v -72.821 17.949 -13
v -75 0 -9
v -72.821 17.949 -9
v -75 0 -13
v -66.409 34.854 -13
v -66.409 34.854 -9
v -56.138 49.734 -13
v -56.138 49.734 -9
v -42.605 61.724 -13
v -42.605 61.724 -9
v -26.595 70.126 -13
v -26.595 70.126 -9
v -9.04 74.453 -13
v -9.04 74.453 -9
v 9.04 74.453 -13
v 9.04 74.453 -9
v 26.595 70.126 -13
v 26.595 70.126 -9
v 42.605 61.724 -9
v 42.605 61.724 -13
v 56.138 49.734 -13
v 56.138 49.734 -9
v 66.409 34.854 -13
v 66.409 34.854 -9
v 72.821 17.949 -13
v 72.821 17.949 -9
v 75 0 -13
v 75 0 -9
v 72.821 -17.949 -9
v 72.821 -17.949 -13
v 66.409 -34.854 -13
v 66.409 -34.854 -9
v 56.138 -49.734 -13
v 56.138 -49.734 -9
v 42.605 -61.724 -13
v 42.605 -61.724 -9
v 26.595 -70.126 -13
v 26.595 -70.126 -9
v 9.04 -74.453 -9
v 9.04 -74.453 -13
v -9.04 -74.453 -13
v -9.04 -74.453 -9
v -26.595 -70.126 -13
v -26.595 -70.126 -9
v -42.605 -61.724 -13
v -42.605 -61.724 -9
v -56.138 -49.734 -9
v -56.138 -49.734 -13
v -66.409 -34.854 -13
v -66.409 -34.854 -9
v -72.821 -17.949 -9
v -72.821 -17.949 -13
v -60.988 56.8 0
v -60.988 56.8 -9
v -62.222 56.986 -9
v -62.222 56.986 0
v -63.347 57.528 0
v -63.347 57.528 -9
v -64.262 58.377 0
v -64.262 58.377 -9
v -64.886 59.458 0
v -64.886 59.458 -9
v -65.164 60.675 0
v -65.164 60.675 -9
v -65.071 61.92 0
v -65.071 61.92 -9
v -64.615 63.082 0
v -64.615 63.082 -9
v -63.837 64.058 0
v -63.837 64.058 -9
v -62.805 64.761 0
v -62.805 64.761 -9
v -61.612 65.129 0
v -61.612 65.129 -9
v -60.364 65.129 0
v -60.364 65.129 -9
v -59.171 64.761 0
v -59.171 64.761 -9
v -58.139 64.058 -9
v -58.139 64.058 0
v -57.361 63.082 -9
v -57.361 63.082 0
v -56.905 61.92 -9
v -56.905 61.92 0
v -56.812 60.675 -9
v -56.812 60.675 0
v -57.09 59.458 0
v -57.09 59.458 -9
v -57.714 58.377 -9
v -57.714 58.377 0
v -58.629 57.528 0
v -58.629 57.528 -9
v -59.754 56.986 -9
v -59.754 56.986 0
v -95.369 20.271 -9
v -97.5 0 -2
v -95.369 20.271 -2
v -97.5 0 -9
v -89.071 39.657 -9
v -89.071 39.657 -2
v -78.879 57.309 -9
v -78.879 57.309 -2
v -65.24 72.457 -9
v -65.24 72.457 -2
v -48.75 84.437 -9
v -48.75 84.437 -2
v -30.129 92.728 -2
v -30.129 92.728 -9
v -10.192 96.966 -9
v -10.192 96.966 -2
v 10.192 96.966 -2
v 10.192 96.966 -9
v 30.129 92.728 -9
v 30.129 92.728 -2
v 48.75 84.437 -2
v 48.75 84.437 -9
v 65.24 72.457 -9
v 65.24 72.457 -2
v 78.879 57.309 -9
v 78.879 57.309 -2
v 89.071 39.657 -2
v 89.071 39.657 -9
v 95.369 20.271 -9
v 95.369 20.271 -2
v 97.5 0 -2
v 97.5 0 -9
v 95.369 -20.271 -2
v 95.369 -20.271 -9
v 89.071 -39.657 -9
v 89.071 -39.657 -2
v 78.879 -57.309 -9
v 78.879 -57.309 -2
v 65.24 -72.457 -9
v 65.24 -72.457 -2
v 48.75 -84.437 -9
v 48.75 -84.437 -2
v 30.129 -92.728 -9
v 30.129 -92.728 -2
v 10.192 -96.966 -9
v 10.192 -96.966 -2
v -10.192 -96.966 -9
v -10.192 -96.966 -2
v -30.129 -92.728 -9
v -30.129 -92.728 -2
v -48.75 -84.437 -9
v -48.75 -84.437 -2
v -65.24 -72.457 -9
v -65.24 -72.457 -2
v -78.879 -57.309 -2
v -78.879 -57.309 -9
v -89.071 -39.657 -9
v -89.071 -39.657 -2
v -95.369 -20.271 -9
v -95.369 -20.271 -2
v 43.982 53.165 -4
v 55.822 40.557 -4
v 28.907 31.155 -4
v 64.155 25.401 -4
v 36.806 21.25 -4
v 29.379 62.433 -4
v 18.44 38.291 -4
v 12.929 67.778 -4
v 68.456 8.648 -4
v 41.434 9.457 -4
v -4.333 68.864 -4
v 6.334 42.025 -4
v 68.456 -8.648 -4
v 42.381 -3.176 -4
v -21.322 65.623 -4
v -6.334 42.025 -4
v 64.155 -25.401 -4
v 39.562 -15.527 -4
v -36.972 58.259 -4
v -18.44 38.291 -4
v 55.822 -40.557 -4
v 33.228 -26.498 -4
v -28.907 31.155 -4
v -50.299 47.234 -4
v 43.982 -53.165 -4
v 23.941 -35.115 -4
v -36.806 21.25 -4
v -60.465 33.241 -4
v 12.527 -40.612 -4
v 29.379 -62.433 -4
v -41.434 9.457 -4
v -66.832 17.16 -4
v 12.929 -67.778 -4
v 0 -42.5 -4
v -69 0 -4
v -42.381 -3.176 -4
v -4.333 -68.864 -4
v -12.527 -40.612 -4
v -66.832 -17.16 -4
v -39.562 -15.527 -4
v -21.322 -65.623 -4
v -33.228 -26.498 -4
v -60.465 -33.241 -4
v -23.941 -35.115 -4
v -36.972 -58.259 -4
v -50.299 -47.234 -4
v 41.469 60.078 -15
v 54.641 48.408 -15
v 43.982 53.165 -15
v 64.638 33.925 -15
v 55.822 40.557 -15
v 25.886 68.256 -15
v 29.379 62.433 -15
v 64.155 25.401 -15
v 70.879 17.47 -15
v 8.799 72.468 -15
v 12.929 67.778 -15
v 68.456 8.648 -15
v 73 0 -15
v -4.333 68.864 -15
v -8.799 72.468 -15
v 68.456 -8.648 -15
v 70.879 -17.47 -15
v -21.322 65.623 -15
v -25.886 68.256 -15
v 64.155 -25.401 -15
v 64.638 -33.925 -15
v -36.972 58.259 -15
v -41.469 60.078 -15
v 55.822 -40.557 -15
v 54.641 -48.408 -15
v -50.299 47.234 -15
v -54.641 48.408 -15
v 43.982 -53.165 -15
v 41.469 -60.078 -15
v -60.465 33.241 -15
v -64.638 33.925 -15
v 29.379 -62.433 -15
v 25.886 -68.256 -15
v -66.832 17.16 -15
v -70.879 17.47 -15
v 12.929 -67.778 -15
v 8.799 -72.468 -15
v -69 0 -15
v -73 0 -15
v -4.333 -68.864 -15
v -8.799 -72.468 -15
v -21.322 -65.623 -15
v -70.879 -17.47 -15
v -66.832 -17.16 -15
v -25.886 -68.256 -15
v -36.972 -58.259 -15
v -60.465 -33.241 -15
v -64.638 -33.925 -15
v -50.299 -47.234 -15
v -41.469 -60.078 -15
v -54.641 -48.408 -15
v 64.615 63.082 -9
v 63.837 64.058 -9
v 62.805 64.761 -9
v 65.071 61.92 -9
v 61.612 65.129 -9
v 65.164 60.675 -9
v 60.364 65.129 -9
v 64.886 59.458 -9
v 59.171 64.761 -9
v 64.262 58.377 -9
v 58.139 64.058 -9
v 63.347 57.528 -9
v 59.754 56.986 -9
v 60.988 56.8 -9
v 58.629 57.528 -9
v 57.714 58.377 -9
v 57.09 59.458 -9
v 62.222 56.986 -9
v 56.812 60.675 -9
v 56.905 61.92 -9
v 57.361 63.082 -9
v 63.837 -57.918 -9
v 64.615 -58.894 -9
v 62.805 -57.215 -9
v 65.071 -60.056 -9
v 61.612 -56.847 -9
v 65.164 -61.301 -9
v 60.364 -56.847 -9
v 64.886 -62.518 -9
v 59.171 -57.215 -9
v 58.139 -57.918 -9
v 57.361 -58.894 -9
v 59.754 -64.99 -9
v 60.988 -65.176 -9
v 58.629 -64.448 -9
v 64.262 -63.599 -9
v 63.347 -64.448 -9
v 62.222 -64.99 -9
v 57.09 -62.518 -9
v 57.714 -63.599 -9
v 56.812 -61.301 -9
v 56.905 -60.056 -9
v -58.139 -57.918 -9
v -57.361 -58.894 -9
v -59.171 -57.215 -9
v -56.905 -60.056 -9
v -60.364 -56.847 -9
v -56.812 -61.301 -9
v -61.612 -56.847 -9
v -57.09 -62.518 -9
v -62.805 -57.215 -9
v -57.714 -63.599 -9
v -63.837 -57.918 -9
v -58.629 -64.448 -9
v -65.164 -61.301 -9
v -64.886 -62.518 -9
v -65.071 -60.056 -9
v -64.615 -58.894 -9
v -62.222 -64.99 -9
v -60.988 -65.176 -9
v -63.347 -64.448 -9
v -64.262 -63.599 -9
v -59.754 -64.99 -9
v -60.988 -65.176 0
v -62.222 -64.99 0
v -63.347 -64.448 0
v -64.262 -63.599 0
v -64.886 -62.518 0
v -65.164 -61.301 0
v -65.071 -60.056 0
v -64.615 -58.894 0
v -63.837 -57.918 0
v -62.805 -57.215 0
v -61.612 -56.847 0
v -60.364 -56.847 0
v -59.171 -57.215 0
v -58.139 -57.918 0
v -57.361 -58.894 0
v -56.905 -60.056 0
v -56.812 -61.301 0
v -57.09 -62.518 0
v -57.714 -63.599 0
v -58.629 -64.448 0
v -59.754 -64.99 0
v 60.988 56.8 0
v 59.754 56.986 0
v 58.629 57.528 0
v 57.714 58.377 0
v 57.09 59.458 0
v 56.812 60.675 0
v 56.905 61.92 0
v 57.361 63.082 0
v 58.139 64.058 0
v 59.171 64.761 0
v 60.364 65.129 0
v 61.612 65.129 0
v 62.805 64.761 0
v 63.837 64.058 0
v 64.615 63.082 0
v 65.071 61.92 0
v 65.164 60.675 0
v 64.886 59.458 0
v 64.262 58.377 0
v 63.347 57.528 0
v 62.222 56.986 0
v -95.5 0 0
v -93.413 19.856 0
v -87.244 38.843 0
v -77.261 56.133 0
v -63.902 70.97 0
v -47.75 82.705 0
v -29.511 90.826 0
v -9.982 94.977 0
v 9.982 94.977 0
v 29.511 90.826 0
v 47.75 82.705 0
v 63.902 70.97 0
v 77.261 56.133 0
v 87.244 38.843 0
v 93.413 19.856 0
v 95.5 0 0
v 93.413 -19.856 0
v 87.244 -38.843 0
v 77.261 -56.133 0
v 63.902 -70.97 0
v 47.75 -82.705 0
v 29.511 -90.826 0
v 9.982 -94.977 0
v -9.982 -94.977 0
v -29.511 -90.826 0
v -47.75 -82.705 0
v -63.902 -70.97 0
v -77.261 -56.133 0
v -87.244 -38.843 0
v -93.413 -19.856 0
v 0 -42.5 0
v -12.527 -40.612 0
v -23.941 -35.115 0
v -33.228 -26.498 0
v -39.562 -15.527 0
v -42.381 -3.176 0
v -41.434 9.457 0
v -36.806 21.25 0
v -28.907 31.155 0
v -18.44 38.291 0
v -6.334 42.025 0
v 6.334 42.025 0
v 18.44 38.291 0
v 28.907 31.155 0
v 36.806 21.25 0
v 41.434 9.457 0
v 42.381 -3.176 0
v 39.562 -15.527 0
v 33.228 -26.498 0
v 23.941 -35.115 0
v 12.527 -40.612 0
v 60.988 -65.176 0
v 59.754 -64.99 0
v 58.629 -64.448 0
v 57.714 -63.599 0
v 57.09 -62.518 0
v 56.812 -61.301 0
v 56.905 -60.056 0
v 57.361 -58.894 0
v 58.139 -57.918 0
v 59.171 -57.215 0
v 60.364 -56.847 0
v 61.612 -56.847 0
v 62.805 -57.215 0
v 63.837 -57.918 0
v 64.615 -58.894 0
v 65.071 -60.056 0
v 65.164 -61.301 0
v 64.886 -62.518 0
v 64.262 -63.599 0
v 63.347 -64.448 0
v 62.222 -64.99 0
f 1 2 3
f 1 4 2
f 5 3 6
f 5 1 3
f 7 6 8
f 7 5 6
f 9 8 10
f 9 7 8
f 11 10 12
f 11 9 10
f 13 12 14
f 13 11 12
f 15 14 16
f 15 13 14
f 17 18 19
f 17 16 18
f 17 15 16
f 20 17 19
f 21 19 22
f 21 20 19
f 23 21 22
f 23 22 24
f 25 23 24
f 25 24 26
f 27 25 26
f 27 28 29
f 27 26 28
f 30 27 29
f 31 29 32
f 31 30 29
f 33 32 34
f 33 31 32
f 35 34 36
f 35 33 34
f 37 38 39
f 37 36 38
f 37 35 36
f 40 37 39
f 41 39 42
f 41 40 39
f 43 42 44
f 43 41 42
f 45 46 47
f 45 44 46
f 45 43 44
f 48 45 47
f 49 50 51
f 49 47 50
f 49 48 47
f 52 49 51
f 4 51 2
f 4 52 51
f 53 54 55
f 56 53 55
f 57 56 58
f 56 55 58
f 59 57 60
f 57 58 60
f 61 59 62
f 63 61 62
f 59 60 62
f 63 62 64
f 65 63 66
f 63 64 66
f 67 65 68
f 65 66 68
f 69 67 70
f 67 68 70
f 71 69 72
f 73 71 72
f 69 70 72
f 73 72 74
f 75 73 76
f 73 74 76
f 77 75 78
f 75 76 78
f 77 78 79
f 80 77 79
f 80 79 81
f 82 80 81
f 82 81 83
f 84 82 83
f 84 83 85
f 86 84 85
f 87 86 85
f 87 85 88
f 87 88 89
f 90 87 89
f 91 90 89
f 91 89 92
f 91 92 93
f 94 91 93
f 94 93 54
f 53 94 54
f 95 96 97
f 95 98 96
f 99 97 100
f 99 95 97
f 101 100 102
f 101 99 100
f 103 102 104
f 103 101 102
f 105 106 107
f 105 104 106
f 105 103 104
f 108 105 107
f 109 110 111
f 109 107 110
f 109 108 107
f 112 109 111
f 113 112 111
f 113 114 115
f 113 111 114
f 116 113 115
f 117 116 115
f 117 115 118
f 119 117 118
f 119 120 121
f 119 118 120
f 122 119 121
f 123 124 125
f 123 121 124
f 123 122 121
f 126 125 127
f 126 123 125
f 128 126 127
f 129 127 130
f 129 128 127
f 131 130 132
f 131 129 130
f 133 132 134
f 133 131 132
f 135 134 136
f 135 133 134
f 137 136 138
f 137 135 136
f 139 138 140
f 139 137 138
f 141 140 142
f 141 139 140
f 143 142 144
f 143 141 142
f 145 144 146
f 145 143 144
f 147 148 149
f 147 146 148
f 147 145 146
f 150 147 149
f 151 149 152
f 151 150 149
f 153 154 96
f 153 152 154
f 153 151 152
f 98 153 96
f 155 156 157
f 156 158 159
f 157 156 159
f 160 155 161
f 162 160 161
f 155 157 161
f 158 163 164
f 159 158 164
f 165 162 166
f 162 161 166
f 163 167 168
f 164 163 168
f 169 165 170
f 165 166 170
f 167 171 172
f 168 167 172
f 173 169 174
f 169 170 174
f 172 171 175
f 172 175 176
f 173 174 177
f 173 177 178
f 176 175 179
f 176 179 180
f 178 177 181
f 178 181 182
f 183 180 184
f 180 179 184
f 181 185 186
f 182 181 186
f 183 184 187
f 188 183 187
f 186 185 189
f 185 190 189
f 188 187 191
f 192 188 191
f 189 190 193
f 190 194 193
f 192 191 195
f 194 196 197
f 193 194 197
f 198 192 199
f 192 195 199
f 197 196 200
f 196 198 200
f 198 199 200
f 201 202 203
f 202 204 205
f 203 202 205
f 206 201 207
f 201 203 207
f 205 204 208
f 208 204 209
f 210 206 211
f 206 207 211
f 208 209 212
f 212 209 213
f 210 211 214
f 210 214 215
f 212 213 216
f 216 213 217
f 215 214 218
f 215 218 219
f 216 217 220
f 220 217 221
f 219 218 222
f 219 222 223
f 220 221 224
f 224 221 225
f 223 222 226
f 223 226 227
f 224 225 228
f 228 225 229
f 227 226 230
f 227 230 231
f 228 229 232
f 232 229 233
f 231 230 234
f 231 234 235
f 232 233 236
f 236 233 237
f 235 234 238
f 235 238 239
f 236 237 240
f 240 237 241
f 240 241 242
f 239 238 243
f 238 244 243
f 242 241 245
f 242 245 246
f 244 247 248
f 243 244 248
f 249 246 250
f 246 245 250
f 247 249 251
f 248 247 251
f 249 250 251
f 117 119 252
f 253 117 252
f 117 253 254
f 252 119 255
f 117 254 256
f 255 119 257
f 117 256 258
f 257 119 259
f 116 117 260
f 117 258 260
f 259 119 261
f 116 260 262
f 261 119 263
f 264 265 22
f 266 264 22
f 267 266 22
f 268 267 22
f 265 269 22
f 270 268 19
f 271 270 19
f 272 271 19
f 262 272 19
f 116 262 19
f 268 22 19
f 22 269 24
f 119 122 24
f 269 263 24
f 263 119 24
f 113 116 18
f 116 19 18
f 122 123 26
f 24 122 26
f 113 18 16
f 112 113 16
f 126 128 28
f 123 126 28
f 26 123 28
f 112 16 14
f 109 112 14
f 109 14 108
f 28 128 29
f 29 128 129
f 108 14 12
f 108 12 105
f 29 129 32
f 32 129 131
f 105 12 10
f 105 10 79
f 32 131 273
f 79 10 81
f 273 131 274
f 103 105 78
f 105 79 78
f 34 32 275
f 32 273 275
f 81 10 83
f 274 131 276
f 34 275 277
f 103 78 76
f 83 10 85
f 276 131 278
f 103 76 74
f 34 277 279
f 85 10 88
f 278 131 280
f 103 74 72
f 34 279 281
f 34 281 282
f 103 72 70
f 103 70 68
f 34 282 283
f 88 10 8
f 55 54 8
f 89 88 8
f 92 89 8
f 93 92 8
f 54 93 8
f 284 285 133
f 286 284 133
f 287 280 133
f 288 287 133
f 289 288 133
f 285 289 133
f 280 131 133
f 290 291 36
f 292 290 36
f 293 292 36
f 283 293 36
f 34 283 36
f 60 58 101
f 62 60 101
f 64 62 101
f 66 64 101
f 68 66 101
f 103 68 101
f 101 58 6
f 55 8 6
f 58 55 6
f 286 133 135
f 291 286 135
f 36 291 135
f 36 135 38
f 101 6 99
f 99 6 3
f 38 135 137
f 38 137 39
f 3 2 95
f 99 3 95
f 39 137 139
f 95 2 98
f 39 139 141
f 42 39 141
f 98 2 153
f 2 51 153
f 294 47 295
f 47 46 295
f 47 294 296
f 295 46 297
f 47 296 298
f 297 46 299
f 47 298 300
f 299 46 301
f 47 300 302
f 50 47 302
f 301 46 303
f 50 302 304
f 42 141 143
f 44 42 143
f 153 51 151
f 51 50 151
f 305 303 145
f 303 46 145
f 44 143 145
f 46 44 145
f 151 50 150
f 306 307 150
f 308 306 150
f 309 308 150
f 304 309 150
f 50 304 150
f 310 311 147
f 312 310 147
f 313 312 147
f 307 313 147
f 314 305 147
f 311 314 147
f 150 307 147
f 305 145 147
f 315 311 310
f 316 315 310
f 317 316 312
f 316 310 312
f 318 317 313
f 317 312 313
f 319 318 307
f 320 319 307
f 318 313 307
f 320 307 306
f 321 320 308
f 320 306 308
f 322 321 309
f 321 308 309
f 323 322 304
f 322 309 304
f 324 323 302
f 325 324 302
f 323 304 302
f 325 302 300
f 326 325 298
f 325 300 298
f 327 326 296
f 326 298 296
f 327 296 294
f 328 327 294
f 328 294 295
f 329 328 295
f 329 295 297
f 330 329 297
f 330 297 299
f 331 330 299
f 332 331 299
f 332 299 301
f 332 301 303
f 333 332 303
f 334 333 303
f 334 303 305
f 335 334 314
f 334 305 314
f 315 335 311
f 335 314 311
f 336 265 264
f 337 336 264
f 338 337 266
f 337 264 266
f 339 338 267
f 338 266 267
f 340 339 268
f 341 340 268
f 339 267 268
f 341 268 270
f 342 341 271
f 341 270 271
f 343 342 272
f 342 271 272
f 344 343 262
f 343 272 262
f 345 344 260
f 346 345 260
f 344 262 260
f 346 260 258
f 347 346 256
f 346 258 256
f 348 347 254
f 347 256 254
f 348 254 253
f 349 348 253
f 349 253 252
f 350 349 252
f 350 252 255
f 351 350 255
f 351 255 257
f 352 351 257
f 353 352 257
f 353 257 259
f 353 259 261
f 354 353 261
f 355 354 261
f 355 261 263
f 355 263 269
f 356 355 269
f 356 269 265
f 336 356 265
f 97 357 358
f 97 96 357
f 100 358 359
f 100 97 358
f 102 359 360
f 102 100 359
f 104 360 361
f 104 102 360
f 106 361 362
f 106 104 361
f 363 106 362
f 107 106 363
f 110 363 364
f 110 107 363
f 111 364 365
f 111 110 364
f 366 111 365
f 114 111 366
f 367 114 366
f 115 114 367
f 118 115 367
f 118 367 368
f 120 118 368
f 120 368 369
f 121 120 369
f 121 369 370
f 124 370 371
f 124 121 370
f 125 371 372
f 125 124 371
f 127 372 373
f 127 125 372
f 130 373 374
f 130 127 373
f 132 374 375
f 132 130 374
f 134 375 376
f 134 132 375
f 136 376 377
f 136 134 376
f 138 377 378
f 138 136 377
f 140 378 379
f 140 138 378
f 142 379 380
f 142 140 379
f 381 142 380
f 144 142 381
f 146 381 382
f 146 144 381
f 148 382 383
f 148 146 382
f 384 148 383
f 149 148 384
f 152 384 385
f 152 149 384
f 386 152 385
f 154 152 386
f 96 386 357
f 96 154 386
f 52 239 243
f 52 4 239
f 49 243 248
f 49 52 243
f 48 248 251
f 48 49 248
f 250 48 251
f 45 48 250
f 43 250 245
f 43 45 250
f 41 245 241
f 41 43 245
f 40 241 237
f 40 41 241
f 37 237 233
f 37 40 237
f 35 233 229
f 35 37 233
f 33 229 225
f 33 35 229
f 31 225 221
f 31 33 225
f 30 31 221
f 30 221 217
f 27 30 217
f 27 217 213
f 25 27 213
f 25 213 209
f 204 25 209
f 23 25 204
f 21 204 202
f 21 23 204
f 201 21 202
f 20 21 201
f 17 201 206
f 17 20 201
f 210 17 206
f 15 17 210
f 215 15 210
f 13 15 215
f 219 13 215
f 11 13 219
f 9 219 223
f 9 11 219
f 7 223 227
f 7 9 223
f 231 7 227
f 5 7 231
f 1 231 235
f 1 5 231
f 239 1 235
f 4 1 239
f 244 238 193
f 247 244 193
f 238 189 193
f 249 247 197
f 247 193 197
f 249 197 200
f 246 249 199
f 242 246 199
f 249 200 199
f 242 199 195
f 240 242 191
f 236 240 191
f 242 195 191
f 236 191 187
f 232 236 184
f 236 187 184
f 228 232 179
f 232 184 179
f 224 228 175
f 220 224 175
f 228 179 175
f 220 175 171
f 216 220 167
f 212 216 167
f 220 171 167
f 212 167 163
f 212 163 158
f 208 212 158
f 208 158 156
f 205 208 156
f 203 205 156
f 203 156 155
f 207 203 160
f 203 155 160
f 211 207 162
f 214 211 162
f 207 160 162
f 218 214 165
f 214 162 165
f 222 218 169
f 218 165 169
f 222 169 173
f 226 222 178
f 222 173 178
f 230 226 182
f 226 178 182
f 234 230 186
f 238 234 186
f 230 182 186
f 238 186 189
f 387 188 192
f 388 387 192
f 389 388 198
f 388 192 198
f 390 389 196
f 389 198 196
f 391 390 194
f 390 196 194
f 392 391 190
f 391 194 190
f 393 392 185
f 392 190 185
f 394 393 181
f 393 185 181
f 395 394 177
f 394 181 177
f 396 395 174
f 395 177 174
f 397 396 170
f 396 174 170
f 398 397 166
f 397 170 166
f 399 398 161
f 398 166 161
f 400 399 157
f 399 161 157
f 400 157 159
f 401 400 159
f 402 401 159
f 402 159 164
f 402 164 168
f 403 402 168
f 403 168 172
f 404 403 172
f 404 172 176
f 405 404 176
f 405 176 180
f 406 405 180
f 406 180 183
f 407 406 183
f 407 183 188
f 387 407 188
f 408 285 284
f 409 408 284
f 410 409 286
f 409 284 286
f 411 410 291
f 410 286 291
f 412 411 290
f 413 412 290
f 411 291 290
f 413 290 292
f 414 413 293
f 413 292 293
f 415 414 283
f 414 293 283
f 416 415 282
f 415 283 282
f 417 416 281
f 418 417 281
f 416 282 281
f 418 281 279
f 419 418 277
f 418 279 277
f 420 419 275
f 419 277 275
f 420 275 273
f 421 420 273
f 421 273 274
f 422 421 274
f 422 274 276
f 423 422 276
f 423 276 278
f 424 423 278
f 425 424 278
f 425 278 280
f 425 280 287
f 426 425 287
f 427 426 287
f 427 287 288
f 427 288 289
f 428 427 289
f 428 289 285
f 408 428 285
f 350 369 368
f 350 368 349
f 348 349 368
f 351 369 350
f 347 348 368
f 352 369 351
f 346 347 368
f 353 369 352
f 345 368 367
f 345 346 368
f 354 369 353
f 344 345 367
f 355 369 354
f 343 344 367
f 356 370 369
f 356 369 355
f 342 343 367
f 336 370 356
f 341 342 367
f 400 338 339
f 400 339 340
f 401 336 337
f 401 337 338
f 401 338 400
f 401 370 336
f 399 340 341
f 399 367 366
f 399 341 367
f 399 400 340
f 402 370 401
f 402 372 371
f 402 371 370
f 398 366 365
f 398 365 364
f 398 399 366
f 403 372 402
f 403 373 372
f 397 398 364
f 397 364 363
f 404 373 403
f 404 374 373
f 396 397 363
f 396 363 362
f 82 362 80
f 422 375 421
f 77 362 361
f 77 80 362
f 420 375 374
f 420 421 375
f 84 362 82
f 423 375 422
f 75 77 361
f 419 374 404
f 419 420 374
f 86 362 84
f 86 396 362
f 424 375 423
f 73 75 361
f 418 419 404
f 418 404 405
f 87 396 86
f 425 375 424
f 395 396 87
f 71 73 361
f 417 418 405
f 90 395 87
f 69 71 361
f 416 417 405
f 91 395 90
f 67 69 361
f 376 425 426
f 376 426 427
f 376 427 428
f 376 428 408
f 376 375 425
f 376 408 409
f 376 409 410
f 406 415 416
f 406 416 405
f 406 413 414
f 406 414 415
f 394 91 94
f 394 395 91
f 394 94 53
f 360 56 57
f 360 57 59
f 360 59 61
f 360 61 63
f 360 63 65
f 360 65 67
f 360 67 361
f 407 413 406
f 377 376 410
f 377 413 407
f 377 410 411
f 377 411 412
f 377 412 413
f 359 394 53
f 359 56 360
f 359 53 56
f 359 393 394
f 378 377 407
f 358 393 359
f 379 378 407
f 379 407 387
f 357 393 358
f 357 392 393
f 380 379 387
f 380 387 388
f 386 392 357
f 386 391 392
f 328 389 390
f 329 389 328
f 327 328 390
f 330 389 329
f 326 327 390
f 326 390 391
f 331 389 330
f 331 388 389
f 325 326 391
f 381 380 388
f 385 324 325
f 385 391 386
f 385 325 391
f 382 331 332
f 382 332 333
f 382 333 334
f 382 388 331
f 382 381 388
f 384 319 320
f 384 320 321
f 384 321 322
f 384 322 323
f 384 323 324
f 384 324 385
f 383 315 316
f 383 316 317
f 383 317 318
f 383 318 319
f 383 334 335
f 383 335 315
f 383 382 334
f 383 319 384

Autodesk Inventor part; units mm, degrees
ref_plane "YZ Plane" through (0, 0, 0) normal (1, 0, 0) x (0, 1, 0)
ref_plane "XZ Plane" through (0, 0, 0) normal (0, 1, 0) x (-1, 0, 0)
ref_plane "XY Plane" through (0, 0, 0) normal (0, 0, 1) x (1, 0, 0)
sketch "Эскиз1" plane through (0, 0, 0) normal (0, 1, 0) x (-1, 0, 0)
  line L0 (0, 0) -> (97.5, 0)
  line L1 (97.5, 0) -> (97.5, -9)
  line L2 (97.5, -9) -> (75, -9)
  line L3 (75, -9) -> (75, -15)
  line L4 (0, -4) -> (0, 0)
  line L5 (75, -15) -> (69, -15)
  line L6 (69, -15) -> (69, -4)
  line L7 (69, -4) -> (0, -4)
  dimension "d0" = 195
  dimension "d1" = 150
  dimension "d3" = 9
  dimension "d5" = 15
  dimension "d6" = 138
  dimension "d7" = 4
revolve "Вращение1" add sketch "Эскиз1" angle 360 about axis through (0, 0, -4) along (0, 0, 1)
sketch "Эскиз3" plane through (0, 0, 0) normal (0, 0, 1) x (1, 0, 0)
  circle A0 centre (0, 0) radius 86.25 construction
  line L0 (0, 0) -> (-91.162, -91.162) construction
  line L1 (0, 0) -> (128.9225, 0) construction
  point P0 (0, 0)
  point P1 (-60.988, -60.988)
  point P2 (60.988, -60.988)
  point P3 (60.988, 60.988)
  point P4 (-60.988, 60.988)
  dimension "d15" = 172.5
  dimension "d16" = 135
  dimension "d19" = 360
hole "Отверстие1" at (-60.988, -60.988, 0) at (60.988, -60.988, 0) at (60.988, 60.988, 0) at (-60.988, 60.988, 0) direction (0, 0, -1) diameter 8.376 end through all thread size "M10x1.5" class "6H" standard "ISO Metric profile"
chamfer "Фаска1" distance 2 angle 45 2 edges at (75, 0, -15) (97.5, 0, 0)
sketch "Эскиз4" plane through (0, 0, 0) normal (0, 0, 1) x (1, 0, 0)
  circle A0 centre (0, 0) radius 97.5 projected
  point P0 (0, 0)
hole "Отверстие2" at (0, 0, 0) direction (0, 0, -1) diameter 85 end through all
properties part number "МПСТ Крышка подшипника с отверстием 150" material "Сталь, углеродистая"
